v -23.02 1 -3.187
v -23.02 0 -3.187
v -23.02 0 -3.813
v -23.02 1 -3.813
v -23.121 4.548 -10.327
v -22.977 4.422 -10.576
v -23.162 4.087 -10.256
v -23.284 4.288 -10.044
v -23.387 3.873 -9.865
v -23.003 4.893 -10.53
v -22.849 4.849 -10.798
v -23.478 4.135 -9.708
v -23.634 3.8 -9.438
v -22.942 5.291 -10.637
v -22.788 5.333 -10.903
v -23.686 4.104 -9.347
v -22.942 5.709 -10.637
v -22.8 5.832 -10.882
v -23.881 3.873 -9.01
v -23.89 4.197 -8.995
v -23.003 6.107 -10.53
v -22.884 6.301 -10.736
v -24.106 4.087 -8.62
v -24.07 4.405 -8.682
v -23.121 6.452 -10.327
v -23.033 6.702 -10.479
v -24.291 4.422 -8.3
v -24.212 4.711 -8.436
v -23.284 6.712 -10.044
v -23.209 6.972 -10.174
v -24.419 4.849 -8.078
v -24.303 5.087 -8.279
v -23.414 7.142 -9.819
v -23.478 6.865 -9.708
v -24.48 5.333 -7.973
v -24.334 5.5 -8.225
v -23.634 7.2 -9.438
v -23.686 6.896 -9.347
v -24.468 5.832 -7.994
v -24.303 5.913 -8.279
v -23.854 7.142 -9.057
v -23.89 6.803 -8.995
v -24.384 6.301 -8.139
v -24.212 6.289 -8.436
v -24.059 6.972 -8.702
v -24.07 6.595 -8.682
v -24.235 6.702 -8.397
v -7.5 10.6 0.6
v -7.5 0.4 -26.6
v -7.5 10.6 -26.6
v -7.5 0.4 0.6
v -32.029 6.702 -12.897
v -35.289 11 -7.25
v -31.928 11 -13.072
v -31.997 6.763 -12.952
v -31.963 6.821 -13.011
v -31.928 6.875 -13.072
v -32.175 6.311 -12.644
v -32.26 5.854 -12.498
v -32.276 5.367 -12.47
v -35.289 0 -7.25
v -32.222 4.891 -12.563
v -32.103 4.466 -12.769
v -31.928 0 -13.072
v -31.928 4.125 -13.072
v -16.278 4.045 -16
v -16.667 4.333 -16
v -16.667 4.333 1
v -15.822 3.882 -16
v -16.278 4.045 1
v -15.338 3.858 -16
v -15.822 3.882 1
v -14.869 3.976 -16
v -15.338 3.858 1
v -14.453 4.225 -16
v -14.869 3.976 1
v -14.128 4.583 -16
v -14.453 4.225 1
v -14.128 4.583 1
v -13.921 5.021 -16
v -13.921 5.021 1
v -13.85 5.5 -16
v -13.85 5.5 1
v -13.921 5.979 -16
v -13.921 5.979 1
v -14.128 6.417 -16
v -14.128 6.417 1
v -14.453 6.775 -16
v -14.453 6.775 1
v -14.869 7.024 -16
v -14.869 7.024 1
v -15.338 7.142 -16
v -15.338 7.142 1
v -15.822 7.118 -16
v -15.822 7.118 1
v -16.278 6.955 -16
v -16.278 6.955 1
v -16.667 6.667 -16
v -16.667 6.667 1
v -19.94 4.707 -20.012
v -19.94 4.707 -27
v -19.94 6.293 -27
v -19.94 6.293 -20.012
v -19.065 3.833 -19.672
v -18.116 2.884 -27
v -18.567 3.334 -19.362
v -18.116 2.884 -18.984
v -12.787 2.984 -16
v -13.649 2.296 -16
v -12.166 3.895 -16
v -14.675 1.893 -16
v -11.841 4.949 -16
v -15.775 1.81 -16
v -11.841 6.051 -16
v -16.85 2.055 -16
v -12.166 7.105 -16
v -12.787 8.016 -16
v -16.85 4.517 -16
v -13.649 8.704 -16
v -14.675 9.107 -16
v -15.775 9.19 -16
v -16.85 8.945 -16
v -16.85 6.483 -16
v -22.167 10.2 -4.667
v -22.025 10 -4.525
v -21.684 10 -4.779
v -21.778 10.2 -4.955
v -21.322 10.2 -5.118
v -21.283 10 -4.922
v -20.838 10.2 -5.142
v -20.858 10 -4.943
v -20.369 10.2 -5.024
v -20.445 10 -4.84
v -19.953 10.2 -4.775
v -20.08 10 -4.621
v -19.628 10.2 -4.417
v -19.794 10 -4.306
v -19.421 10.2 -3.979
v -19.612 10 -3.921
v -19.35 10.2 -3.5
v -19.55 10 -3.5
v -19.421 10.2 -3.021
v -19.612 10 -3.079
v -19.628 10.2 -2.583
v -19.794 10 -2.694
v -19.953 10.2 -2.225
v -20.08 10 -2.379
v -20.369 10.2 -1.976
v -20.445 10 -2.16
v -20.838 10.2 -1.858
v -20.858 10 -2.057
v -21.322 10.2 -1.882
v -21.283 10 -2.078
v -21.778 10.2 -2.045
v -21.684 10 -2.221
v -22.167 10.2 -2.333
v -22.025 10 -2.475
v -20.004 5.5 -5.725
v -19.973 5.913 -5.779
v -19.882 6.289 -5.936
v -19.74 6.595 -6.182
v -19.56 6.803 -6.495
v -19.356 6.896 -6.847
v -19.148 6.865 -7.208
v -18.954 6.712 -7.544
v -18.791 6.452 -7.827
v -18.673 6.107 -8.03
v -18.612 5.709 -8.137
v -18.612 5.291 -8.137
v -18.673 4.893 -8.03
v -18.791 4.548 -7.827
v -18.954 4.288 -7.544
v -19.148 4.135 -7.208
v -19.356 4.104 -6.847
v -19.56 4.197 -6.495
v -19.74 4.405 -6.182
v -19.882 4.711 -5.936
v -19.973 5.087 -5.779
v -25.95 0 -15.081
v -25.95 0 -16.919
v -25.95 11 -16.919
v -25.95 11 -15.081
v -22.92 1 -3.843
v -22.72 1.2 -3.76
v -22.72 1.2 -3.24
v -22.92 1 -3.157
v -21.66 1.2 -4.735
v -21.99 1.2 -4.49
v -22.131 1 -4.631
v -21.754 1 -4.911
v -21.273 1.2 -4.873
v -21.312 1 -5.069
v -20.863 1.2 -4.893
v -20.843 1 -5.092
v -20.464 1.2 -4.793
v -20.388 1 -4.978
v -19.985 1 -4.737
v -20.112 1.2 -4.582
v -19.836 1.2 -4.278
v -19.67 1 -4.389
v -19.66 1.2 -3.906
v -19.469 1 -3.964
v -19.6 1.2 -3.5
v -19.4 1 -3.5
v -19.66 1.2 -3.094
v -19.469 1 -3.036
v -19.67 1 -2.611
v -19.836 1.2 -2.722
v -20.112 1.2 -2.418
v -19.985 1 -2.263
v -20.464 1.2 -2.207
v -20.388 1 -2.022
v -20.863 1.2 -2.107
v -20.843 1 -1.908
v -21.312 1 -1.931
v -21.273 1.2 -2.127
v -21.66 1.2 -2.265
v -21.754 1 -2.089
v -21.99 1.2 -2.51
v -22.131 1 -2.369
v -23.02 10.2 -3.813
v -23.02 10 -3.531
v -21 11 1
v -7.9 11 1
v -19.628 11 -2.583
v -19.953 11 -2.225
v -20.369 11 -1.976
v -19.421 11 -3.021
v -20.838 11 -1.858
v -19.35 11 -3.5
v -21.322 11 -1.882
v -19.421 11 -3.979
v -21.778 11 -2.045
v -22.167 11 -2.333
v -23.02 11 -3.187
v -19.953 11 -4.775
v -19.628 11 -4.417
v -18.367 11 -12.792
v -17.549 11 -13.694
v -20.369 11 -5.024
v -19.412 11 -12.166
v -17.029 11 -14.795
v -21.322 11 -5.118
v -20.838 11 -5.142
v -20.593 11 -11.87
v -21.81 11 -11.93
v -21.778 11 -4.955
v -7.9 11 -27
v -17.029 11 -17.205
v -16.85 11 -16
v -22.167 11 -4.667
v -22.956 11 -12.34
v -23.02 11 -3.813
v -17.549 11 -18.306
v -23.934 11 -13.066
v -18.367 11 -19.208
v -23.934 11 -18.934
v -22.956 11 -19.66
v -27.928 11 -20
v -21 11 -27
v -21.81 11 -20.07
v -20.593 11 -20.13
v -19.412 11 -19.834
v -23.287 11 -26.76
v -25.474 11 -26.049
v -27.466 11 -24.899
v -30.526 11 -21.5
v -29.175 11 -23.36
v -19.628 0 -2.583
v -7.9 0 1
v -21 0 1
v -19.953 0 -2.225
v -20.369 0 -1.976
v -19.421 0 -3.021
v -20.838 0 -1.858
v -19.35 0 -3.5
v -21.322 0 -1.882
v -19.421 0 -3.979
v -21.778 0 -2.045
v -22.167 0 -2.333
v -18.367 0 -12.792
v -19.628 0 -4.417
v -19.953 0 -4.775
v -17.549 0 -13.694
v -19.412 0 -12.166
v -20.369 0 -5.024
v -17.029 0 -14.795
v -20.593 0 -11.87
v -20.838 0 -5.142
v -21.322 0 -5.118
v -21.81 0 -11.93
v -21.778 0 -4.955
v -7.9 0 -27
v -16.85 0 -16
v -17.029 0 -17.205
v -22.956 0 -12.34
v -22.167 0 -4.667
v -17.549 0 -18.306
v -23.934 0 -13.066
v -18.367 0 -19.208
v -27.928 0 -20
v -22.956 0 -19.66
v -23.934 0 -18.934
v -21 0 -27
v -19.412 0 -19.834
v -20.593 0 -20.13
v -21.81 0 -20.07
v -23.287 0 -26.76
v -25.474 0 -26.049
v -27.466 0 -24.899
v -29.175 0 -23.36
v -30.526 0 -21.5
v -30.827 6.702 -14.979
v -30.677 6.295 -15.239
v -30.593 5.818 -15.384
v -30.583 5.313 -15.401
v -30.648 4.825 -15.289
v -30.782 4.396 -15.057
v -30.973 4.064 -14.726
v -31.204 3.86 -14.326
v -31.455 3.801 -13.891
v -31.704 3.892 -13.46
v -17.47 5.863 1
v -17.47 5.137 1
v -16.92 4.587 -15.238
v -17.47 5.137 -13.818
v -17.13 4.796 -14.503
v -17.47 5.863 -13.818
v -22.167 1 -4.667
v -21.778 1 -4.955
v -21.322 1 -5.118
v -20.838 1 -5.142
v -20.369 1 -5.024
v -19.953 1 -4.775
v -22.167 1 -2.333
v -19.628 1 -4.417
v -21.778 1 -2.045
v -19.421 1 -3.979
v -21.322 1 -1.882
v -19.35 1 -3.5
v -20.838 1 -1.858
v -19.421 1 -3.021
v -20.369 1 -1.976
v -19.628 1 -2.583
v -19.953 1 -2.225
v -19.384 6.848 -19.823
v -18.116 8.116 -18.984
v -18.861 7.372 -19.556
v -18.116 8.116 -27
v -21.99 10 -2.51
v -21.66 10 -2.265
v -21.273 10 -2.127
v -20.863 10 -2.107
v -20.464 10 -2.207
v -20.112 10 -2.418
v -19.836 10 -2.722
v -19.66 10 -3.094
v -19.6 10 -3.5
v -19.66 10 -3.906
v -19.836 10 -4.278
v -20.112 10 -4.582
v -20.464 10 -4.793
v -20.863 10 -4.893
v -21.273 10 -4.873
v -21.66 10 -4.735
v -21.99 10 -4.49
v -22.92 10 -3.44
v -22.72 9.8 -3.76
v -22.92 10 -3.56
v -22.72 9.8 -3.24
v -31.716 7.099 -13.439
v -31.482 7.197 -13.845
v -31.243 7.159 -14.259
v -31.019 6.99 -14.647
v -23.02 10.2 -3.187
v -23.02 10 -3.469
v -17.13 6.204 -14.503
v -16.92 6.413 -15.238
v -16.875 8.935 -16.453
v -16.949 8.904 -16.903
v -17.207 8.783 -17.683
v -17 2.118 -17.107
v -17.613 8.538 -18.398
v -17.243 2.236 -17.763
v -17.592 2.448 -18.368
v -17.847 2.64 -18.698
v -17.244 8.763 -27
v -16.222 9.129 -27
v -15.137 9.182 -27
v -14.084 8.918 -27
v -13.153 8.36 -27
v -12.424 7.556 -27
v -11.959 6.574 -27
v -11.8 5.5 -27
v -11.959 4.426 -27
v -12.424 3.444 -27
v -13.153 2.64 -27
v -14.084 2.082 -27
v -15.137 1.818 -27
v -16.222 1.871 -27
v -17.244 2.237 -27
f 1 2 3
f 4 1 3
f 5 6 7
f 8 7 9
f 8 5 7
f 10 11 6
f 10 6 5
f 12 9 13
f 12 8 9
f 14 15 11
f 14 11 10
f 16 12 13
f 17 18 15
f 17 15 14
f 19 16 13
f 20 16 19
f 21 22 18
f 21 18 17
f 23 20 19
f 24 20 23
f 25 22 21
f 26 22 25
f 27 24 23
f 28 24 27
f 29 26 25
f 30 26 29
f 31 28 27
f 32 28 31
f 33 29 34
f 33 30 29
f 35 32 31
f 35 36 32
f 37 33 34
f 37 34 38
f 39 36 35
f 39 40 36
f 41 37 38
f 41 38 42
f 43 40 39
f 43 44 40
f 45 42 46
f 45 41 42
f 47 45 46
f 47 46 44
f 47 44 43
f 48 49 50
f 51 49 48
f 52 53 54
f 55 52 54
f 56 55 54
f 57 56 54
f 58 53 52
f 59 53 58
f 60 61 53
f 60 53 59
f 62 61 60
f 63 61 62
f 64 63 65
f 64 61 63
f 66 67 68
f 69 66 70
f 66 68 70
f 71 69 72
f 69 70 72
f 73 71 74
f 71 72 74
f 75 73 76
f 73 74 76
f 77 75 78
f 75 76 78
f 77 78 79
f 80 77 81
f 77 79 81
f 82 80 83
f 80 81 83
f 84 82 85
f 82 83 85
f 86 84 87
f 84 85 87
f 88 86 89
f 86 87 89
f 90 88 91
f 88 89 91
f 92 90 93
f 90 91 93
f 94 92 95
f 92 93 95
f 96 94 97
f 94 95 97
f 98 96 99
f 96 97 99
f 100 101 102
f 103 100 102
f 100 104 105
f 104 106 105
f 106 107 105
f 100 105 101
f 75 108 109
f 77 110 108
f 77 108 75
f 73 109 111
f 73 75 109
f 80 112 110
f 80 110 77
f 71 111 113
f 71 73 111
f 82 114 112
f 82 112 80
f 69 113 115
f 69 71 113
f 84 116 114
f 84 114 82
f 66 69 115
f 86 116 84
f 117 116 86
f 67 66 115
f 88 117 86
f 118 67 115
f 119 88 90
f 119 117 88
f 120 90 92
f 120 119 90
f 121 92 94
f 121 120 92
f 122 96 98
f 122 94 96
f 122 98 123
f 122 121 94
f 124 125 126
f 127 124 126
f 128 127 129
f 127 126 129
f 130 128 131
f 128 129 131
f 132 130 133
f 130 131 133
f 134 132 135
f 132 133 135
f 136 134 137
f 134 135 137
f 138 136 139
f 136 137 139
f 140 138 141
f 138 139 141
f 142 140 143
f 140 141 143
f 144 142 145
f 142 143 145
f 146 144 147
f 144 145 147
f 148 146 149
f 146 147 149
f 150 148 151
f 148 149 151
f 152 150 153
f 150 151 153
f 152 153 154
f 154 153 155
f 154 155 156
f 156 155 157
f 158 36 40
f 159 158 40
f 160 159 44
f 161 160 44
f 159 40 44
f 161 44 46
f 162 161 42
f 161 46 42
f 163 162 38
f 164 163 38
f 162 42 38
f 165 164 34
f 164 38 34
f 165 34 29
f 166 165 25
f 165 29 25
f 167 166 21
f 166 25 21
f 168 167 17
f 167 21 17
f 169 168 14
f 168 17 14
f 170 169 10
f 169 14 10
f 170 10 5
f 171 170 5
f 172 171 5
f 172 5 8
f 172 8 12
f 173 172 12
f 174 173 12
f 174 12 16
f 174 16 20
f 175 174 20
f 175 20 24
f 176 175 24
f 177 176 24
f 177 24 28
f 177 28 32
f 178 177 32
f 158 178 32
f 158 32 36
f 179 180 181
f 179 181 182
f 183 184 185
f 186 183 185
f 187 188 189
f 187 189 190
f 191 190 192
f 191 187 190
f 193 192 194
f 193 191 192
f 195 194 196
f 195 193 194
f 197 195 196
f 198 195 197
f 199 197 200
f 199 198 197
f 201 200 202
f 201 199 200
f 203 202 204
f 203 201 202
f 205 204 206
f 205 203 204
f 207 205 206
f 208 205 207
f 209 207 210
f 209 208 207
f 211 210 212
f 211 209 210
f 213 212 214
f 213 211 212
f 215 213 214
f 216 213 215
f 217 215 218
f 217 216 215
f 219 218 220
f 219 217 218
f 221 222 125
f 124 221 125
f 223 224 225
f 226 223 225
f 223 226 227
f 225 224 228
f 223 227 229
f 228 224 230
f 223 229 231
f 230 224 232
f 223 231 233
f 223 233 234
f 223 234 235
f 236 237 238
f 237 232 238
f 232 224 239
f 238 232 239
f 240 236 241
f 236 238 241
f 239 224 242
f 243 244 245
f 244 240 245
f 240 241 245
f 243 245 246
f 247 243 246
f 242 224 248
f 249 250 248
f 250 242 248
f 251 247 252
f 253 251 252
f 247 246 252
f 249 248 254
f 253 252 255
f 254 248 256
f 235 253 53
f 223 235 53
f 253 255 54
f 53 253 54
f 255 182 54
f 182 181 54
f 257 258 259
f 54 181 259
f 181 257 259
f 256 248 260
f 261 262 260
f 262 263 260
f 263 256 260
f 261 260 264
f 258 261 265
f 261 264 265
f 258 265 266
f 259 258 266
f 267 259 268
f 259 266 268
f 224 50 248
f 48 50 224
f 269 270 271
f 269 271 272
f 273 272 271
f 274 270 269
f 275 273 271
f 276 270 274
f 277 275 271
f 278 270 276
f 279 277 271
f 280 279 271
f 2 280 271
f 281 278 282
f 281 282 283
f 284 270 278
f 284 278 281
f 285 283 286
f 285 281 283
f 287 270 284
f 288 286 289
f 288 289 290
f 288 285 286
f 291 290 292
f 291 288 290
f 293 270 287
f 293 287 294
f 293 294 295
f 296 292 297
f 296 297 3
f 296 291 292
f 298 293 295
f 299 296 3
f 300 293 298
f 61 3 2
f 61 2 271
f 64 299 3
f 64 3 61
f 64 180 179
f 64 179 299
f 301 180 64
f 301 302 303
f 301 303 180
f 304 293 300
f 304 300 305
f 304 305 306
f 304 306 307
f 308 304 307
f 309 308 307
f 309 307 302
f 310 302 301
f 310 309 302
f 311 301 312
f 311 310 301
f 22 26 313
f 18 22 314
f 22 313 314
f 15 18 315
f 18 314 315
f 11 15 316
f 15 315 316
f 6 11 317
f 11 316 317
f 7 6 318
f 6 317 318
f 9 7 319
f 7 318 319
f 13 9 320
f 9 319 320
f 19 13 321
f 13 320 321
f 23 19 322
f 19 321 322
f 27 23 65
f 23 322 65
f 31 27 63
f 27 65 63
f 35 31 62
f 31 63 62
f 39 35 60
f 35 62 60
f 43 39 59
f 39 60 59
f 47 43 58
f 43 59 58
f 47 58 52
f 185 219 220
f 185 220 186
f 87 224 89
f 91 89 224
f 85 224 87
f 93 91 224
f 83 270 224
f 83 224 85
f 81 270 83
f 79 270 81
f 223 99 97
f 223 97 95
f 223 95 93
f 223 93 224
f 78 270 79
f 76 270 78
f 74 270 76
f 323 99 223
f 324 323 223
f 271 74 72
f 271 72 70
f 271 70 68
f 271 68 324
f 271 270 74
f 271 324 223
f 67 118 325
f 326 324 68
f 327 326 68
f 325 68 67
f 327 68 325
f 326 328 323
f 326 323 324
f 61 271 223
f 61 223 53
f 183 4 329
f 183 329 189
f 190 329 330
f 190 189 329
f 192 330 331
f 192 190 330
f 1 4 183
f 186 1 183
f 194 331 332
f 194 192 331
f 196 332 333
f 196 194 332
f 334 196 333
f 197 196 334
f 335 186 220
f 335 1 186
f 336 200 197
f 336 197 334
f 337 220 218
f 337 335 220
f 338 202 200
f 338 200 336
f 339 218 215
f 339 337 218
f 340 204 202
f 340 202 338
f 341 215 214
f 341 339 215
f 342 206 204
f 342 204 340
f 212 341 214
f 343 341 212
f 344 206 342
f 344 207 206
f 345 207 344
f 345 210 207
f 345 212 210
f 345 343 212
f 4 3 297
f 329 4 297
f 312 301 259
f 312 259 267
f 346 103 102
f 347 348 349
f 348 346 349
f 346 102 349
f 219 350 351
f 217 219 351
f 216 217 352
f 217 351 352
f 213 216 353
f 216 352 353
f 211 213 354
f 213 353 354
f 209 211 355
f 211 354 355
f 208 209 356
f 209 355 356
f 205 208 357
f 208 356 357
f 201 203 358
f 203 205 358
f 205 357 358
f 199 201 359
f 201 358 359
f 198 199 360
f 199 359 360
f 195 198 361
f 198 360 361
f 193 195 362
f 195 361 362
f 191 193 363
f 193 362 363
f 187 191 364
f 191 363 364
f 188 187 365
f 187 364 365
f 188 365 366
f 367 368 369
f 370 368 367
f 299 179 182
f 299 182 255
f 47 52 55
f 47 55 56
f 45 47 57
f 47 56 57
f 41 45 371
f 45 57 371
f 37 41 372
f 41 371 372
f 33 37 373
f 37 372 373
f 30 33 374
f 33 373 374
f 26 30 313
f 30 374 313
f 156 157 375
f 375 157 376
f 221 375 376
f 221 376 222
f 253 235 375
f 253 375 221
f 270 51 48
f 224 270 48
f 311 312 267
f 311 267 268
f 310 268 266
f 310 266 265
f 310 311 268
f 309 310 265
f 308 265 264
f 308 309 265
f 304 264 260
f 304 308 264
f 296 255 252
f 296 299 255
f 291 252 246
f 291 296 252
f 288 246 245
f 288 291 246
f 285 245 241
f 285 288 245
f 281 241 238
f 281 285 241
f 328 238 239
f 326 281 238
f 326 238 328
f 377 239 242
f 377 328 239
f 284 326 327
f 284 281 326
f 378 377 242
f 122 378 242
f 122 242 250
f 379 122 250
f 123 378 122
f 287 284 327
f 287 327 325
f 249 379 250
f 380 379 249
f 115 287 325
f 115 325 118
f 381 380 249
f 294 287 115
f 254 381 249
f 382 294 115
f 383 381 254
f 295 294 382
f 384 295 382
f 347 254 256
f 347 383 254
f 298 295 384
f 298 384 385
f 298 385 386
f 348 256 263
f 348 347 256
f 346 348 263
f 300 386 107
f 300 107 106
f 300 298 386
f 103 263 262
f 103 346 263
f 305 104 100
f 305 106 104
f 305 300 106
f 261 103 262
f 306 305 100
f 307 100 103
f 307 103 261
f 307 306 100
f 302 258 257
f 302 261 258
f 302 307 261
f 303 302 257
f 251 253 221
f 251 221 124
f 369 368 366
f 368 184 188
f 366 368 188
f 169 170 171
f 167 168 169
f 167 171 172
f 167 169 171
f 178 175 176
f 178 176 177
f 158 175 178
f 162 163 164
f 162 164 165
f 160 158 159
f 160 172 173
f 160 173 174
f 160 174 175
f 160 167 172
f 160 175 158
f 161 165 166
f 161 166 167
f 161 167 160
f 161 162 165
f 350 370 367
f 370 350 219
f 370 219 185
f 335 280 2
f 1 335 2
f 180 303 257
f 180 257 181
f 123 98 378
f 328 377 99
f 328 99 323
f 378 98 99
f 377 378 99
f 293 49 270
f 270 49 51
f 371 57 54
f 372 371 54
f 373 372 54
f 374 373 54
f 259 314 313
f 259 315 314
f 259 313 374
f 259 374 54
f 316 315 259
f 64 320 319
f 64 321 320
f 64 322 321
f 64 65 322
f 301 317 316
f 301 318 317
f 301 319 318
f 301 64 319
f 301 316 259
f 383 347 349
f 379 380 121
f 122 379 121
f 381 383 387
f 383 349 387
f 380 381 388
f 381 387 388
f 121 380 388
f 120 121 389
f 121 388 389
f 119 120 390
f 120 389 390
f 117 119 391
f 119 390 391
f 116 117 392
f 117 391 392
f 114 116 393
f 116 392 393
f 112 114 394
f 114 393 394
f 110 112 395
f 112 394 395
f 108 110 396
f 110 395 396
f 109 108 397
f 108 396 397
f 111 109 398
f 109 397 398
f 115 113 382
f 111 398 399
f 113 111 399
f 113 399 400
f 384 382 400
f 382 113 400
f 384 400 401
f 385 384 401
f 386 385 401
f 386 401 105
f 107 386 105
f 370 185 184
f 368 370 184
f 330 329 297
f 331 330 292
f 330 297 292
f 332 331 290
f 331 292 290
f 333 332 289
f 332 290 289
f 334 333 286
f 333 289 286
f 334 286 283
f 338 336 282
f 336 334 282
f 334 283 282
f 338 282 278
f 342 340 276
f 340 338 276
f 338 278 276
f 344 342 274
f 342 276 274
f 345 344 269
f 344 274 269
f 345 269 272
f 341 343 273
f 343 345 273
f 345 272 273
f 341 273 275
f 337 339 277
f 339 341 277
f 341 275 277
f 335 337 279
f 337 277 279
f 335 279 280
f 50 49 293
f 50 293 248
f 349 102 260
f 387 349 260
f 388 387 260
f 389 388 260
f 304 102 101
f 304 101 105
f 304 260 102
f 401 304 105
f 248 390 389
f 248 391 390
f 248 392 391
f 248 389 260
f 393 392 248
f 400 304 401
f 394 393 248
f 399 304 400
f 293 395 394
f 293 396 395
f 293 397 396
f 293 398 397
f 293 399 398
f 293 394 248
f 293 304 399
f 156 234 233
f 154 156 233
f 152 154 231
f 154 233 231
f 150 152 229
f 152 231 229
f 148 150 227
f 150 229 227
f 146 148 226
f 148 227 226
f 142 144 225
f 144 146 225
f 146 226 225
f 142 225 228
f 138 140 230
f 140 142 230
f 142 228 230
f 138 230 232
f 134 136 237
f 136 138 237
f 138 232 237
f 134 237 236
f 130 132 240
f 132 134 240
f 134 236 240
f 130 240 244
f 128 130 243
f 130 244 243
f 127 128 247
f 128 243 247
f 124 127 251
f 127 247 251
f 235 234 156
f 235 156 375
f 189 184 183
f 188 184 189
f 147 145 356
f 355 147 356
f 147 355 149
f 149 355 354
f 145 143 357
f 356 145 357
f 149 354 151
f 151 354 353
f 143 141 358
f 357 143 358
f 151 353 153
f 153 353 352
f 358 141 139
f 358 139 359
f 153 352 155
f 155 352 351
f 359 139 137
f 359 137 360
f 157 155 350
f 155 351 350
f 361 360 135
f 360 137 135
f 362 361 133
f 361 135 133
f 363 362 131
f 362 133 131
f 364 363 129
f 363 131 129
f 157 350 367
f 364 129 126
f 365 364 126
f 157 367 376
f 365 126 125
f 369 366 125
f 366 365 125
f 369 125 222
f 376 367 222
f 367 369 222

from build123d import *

# Parameters (mm, degrees)
SKETCH1_R           = 4.15
BOSS_EXTRUDE1_DEPTH = 11
SKETCH2_R           = 1.65
CUT_EXTRUDE1_DEPTH  = 29
SKETCH3_R           = 3.7
CUT_EXTRUDE2_DEPTH  = 11
SKETCH5_R           = 1.4
CUT_EXTRUDE4_DEPTH  = 12.0000001
SKETCH11_R          = 1.4
CUT_EXTRUDE10_DEPTH = 14
CUT_EXTRUDE14_DEPTH = 12.0000001
CUT_EXTRUDE15_DEPTH = 11
CUT_EXTRUDE16_DEPTH = 29.0000001
CUT_EXTRUDE21_DEPTH = 12.0000001
SKETCH20_R          = 1.65
CUT_EXTRUDE18_DEPTH = 1
SKETCH21_R          = 1.65
CUT_EXTRUDE19_DEPTH = 1
CUT_EXTRUDE22_DEPTH = 1
CUT_EXTRUDE23_DEPTH = 1
CHAMFER4_SIZE       = 0.4
CUT_EXTRUDE20_DEPTH = 9
CHAMFER5_SIZE       = 0.2


with BuildPart() as part:
    # Sketch1 → Boss-Extrude1 (new body)
    with BuildSketch(Plane(origin=(0, 0, 0), x_dir=(1, 0, 0), z_dir=(0, 1, 0))):
        with BuildLine():
            Line((-7.5, -1), (-21, -1))
            Line((-21, -1), (-35.289419162, 7.25))
            Line((-35.289419162, 7.25), (-31.92820323, 13.07179677))
            Line((-31.92820323, 13.07179677), (-27.92820323, 20))
            Line((-27.92820323, 20), (-30.526279442, 21.5))
            ThreePointArc((-30.526279442, 21.5), (-26.5, 25.526279442), (-21, 27))
            Line((-21, 27), (-7.5, 27))
            Line((-7.5, 27), (-7.5, -1))
        make_face()
        with Locations((-21, 16)):
            Circle(SKETCH1_R, mode=Mode.SUBTRACT)
    extrude(amount=BOSS_EXTRUDE1_DEPTH)

    # Sketch2 → Cut-Extrude1 (cut, through all)
    with BuildSketch(Plane.XY.offset(1)):
        with Locations((-15.5, 5.5)):
            Circle(SKETCH2_R)
    extrude(amount=-CUT_EXTRUDE1_DEPTH, mode=Mode.SUBTRACT)

    # Sketch3 → Cut-Extrude2 (cut)
    with BuildSketch(Plane(origin=(0, 0, -27), x_dir=(-1, 0, 0), z_dir=(0, 0, -1))):
        with Locations((15.5, 5.5)):
            Circle(SKETCH3_R)
    extrude(amount=-CUT_EXTRUDE2_DEPTH, mode=Mode.SUBTRACT)

    # Sketch5 → Cut-Extrude4 (cut, through all)
    with BuildSketch(Plane(origin=(0, 11, 0), x_dir=(1, 0, 0), z_dir=(0, 1, 0))):
        with Locations((-21, 3.5)):
            Circle(SKETCH5_R)
    extrude(amount=-CUT_EXTRUDE4_DEPTH, mode=Mode.SUBTRACT)

    # Sketch11 → Cut-Extrude10 (cut)
    with BuildSketch(Plane(origin=(-29.606406461, 0, -17.09326674), x_dir=(-0.5, 0, 0.866025404), z_dir=(-0.866025404, 0, -0.5))):
        with Locations((3.643593539, 5.5)):
            Circle(SKETCH11_R)
    extrude(amount=-CUT_EXTRUDE10_DEPTH, mode=Mode.SUBTRACT)

    # Sketch16 → Cut-Extrude14 (cut, through all)
    with BuildSketch(Plane.XZ):
        Polygon((-21, -16), (-23.934493142, -18.934493142), (-25.95, -16.918986284), (-25.95, -15.081013716), (-23.934493142, -13.065506858), align=None)
    extrude(amount=-CUT_EXTRUDE14_DEPTH, mode=Mode.SUBTRACT)

    # Sketch17 → Cut-Extrude15 (cut)
    with BuildSketch(Plane(origin=(0, 0, -27), x_dir=(-1, 0, 0), z_dir=(0, 0, -1))):
        Polygon((15.5, 5.5), (18.11629509, 2.88370491), (19.94, 4.707409819), (19.94, 6.292590181), (18.11629509, 8.11629509), align=None)
    extrude(amount=-CUT_EXTRUDE15_DEPTH, mode=Mode.SUBTRACT)

    # Sketch18 → Cut-Extrude16 (cut, through all)
    with BuildSketch(Plane.XY.offset(1)):
        Polygon((-15.5, 5.5), (-16.666726189, 6.666726189), (-17.47, 5.863452378), (-17.47, 5.136547622), (-16.666726189, 4.333273811), align=None)
    extrude(amount=-CUT_EXTRUDE16_DEPTH, mode=Mode.SUBTRACT)

    # Sketch23 → Cut-Extrude21 (cut, through all)
    with BuildSketch(Plane.XZ):
        Polygon((-21.989949494, -2.510050506), (-22.72, -3.240101013), (-22.72, -3.759898987), (-21.989949494, -4.489949494), align=None)
    extrude(amount=-CUT_EXTRUDE21_DEPTH, mode=Mode.SUBTRACT)

    # Sketch20 → Cut-Extrude18 (cut)
    with BuildSketch(Plane(origin=(0, 11, 0), x_dir=(1, 0, 0), z_dir=(0, 1, 0))):
        with Locations((-21, 3.5)):
            Circle(SKETCH20_R)
    extrude(amount=-CUT_EXTRUDE18_DEPTH, mode=Mode.SUBTRACT)

    # Sketch21 → Cut-Extrude19 (cut)
    with BuildSketch(Plane.XZ):
        with Locations((-21, -3.5)):
            Circle(SKETCH21_R)
    extrude(amount=-CUT_EXTRUDE19_DEPTH, mode=Mode.SUBTRACT)

    # Sketch24 → Cut-Extrude22 (cut)
    with BuildSketch(Plane.XZ):
        Polygon((-22.166726189, -2.333273811), (-23.02, -3.186547622), (-23.02, -3.813452378), (-22.166726189, -4.666726189), align=None)
    extrude(amount=-CUT_EXTRUDE22_DEPTH, mode=Mode.SUBTRACT)

    # Sketch25 → Cut-Extrude23 (cut)
    with BuildSketch(Plane(origin=(0, 11, 0), x_dir=(1, 0, 0), z_dir=(0, 1, 0))):
        Polygon((-23.02, 3.186547622), (-23.02, 3.813452378), (-22.166726189, 4.666726189), (-22.166726189, 2.333273811), align=None)
    extrude(amount=-CUT_EXTRUDE23_DEPTH, mode=Mode.SUBTRACT)

    # Chamfer4
    chamfer4_edges = [part.edges().sort_by_distance(p)[0] for p in [
        (-7.5, 11, -13),
        (-7.5, 5.5, -27),
        (-7.5, 5.5, 1),
        (-7.5, 0, -13),
    ]]
    chamfer(chamfer4_edges, length=CHAMFER4_SIZE)

    # Sketch22 → Cut-Extrude20 (cut)
    with BuildSketch(Plane(origin=(-29.606406461, 0, -17.09326674), x_dir=(-0.5, 0, 0.866025404), z_dir=(-0.866025404, 0, -0.5))):
        with BuildLine():
            ThreePointArc((2.441512011, 6.702081528), (3.643593539, 3.8), (4.845675067, 6.702081528))
            ThreePointArc((4.845675067, 6.702081528), (3.643593539, 7.2), (2.441512011, 6.702081528))
        make_face()
    extrude(amount=-CUT_EXTRUDE20_DEPTH, mode=Mode.SUBTRACT)

    # Chamfer5
    chamfer5_edges = [part.edges().sort_by_distance(p)[0] for p in [
        (-22.354974747, 1, -2.87507576),
        (-19.6, 1, -3.5),
        (-22.354974747, 1, -4.12492424),
        (-22.72, 1, -3.5),
        (-19.35, 10, -3.5),
        (-22.593363094, 10, -2.759910717),
        (-22.593363094, 10, -4.240089283),
        (-22.72, 10, -3.5),
    ]]
    chamfer(chamfer5_edges, length=CHAMFER5_SIZE)


solid = part.part
